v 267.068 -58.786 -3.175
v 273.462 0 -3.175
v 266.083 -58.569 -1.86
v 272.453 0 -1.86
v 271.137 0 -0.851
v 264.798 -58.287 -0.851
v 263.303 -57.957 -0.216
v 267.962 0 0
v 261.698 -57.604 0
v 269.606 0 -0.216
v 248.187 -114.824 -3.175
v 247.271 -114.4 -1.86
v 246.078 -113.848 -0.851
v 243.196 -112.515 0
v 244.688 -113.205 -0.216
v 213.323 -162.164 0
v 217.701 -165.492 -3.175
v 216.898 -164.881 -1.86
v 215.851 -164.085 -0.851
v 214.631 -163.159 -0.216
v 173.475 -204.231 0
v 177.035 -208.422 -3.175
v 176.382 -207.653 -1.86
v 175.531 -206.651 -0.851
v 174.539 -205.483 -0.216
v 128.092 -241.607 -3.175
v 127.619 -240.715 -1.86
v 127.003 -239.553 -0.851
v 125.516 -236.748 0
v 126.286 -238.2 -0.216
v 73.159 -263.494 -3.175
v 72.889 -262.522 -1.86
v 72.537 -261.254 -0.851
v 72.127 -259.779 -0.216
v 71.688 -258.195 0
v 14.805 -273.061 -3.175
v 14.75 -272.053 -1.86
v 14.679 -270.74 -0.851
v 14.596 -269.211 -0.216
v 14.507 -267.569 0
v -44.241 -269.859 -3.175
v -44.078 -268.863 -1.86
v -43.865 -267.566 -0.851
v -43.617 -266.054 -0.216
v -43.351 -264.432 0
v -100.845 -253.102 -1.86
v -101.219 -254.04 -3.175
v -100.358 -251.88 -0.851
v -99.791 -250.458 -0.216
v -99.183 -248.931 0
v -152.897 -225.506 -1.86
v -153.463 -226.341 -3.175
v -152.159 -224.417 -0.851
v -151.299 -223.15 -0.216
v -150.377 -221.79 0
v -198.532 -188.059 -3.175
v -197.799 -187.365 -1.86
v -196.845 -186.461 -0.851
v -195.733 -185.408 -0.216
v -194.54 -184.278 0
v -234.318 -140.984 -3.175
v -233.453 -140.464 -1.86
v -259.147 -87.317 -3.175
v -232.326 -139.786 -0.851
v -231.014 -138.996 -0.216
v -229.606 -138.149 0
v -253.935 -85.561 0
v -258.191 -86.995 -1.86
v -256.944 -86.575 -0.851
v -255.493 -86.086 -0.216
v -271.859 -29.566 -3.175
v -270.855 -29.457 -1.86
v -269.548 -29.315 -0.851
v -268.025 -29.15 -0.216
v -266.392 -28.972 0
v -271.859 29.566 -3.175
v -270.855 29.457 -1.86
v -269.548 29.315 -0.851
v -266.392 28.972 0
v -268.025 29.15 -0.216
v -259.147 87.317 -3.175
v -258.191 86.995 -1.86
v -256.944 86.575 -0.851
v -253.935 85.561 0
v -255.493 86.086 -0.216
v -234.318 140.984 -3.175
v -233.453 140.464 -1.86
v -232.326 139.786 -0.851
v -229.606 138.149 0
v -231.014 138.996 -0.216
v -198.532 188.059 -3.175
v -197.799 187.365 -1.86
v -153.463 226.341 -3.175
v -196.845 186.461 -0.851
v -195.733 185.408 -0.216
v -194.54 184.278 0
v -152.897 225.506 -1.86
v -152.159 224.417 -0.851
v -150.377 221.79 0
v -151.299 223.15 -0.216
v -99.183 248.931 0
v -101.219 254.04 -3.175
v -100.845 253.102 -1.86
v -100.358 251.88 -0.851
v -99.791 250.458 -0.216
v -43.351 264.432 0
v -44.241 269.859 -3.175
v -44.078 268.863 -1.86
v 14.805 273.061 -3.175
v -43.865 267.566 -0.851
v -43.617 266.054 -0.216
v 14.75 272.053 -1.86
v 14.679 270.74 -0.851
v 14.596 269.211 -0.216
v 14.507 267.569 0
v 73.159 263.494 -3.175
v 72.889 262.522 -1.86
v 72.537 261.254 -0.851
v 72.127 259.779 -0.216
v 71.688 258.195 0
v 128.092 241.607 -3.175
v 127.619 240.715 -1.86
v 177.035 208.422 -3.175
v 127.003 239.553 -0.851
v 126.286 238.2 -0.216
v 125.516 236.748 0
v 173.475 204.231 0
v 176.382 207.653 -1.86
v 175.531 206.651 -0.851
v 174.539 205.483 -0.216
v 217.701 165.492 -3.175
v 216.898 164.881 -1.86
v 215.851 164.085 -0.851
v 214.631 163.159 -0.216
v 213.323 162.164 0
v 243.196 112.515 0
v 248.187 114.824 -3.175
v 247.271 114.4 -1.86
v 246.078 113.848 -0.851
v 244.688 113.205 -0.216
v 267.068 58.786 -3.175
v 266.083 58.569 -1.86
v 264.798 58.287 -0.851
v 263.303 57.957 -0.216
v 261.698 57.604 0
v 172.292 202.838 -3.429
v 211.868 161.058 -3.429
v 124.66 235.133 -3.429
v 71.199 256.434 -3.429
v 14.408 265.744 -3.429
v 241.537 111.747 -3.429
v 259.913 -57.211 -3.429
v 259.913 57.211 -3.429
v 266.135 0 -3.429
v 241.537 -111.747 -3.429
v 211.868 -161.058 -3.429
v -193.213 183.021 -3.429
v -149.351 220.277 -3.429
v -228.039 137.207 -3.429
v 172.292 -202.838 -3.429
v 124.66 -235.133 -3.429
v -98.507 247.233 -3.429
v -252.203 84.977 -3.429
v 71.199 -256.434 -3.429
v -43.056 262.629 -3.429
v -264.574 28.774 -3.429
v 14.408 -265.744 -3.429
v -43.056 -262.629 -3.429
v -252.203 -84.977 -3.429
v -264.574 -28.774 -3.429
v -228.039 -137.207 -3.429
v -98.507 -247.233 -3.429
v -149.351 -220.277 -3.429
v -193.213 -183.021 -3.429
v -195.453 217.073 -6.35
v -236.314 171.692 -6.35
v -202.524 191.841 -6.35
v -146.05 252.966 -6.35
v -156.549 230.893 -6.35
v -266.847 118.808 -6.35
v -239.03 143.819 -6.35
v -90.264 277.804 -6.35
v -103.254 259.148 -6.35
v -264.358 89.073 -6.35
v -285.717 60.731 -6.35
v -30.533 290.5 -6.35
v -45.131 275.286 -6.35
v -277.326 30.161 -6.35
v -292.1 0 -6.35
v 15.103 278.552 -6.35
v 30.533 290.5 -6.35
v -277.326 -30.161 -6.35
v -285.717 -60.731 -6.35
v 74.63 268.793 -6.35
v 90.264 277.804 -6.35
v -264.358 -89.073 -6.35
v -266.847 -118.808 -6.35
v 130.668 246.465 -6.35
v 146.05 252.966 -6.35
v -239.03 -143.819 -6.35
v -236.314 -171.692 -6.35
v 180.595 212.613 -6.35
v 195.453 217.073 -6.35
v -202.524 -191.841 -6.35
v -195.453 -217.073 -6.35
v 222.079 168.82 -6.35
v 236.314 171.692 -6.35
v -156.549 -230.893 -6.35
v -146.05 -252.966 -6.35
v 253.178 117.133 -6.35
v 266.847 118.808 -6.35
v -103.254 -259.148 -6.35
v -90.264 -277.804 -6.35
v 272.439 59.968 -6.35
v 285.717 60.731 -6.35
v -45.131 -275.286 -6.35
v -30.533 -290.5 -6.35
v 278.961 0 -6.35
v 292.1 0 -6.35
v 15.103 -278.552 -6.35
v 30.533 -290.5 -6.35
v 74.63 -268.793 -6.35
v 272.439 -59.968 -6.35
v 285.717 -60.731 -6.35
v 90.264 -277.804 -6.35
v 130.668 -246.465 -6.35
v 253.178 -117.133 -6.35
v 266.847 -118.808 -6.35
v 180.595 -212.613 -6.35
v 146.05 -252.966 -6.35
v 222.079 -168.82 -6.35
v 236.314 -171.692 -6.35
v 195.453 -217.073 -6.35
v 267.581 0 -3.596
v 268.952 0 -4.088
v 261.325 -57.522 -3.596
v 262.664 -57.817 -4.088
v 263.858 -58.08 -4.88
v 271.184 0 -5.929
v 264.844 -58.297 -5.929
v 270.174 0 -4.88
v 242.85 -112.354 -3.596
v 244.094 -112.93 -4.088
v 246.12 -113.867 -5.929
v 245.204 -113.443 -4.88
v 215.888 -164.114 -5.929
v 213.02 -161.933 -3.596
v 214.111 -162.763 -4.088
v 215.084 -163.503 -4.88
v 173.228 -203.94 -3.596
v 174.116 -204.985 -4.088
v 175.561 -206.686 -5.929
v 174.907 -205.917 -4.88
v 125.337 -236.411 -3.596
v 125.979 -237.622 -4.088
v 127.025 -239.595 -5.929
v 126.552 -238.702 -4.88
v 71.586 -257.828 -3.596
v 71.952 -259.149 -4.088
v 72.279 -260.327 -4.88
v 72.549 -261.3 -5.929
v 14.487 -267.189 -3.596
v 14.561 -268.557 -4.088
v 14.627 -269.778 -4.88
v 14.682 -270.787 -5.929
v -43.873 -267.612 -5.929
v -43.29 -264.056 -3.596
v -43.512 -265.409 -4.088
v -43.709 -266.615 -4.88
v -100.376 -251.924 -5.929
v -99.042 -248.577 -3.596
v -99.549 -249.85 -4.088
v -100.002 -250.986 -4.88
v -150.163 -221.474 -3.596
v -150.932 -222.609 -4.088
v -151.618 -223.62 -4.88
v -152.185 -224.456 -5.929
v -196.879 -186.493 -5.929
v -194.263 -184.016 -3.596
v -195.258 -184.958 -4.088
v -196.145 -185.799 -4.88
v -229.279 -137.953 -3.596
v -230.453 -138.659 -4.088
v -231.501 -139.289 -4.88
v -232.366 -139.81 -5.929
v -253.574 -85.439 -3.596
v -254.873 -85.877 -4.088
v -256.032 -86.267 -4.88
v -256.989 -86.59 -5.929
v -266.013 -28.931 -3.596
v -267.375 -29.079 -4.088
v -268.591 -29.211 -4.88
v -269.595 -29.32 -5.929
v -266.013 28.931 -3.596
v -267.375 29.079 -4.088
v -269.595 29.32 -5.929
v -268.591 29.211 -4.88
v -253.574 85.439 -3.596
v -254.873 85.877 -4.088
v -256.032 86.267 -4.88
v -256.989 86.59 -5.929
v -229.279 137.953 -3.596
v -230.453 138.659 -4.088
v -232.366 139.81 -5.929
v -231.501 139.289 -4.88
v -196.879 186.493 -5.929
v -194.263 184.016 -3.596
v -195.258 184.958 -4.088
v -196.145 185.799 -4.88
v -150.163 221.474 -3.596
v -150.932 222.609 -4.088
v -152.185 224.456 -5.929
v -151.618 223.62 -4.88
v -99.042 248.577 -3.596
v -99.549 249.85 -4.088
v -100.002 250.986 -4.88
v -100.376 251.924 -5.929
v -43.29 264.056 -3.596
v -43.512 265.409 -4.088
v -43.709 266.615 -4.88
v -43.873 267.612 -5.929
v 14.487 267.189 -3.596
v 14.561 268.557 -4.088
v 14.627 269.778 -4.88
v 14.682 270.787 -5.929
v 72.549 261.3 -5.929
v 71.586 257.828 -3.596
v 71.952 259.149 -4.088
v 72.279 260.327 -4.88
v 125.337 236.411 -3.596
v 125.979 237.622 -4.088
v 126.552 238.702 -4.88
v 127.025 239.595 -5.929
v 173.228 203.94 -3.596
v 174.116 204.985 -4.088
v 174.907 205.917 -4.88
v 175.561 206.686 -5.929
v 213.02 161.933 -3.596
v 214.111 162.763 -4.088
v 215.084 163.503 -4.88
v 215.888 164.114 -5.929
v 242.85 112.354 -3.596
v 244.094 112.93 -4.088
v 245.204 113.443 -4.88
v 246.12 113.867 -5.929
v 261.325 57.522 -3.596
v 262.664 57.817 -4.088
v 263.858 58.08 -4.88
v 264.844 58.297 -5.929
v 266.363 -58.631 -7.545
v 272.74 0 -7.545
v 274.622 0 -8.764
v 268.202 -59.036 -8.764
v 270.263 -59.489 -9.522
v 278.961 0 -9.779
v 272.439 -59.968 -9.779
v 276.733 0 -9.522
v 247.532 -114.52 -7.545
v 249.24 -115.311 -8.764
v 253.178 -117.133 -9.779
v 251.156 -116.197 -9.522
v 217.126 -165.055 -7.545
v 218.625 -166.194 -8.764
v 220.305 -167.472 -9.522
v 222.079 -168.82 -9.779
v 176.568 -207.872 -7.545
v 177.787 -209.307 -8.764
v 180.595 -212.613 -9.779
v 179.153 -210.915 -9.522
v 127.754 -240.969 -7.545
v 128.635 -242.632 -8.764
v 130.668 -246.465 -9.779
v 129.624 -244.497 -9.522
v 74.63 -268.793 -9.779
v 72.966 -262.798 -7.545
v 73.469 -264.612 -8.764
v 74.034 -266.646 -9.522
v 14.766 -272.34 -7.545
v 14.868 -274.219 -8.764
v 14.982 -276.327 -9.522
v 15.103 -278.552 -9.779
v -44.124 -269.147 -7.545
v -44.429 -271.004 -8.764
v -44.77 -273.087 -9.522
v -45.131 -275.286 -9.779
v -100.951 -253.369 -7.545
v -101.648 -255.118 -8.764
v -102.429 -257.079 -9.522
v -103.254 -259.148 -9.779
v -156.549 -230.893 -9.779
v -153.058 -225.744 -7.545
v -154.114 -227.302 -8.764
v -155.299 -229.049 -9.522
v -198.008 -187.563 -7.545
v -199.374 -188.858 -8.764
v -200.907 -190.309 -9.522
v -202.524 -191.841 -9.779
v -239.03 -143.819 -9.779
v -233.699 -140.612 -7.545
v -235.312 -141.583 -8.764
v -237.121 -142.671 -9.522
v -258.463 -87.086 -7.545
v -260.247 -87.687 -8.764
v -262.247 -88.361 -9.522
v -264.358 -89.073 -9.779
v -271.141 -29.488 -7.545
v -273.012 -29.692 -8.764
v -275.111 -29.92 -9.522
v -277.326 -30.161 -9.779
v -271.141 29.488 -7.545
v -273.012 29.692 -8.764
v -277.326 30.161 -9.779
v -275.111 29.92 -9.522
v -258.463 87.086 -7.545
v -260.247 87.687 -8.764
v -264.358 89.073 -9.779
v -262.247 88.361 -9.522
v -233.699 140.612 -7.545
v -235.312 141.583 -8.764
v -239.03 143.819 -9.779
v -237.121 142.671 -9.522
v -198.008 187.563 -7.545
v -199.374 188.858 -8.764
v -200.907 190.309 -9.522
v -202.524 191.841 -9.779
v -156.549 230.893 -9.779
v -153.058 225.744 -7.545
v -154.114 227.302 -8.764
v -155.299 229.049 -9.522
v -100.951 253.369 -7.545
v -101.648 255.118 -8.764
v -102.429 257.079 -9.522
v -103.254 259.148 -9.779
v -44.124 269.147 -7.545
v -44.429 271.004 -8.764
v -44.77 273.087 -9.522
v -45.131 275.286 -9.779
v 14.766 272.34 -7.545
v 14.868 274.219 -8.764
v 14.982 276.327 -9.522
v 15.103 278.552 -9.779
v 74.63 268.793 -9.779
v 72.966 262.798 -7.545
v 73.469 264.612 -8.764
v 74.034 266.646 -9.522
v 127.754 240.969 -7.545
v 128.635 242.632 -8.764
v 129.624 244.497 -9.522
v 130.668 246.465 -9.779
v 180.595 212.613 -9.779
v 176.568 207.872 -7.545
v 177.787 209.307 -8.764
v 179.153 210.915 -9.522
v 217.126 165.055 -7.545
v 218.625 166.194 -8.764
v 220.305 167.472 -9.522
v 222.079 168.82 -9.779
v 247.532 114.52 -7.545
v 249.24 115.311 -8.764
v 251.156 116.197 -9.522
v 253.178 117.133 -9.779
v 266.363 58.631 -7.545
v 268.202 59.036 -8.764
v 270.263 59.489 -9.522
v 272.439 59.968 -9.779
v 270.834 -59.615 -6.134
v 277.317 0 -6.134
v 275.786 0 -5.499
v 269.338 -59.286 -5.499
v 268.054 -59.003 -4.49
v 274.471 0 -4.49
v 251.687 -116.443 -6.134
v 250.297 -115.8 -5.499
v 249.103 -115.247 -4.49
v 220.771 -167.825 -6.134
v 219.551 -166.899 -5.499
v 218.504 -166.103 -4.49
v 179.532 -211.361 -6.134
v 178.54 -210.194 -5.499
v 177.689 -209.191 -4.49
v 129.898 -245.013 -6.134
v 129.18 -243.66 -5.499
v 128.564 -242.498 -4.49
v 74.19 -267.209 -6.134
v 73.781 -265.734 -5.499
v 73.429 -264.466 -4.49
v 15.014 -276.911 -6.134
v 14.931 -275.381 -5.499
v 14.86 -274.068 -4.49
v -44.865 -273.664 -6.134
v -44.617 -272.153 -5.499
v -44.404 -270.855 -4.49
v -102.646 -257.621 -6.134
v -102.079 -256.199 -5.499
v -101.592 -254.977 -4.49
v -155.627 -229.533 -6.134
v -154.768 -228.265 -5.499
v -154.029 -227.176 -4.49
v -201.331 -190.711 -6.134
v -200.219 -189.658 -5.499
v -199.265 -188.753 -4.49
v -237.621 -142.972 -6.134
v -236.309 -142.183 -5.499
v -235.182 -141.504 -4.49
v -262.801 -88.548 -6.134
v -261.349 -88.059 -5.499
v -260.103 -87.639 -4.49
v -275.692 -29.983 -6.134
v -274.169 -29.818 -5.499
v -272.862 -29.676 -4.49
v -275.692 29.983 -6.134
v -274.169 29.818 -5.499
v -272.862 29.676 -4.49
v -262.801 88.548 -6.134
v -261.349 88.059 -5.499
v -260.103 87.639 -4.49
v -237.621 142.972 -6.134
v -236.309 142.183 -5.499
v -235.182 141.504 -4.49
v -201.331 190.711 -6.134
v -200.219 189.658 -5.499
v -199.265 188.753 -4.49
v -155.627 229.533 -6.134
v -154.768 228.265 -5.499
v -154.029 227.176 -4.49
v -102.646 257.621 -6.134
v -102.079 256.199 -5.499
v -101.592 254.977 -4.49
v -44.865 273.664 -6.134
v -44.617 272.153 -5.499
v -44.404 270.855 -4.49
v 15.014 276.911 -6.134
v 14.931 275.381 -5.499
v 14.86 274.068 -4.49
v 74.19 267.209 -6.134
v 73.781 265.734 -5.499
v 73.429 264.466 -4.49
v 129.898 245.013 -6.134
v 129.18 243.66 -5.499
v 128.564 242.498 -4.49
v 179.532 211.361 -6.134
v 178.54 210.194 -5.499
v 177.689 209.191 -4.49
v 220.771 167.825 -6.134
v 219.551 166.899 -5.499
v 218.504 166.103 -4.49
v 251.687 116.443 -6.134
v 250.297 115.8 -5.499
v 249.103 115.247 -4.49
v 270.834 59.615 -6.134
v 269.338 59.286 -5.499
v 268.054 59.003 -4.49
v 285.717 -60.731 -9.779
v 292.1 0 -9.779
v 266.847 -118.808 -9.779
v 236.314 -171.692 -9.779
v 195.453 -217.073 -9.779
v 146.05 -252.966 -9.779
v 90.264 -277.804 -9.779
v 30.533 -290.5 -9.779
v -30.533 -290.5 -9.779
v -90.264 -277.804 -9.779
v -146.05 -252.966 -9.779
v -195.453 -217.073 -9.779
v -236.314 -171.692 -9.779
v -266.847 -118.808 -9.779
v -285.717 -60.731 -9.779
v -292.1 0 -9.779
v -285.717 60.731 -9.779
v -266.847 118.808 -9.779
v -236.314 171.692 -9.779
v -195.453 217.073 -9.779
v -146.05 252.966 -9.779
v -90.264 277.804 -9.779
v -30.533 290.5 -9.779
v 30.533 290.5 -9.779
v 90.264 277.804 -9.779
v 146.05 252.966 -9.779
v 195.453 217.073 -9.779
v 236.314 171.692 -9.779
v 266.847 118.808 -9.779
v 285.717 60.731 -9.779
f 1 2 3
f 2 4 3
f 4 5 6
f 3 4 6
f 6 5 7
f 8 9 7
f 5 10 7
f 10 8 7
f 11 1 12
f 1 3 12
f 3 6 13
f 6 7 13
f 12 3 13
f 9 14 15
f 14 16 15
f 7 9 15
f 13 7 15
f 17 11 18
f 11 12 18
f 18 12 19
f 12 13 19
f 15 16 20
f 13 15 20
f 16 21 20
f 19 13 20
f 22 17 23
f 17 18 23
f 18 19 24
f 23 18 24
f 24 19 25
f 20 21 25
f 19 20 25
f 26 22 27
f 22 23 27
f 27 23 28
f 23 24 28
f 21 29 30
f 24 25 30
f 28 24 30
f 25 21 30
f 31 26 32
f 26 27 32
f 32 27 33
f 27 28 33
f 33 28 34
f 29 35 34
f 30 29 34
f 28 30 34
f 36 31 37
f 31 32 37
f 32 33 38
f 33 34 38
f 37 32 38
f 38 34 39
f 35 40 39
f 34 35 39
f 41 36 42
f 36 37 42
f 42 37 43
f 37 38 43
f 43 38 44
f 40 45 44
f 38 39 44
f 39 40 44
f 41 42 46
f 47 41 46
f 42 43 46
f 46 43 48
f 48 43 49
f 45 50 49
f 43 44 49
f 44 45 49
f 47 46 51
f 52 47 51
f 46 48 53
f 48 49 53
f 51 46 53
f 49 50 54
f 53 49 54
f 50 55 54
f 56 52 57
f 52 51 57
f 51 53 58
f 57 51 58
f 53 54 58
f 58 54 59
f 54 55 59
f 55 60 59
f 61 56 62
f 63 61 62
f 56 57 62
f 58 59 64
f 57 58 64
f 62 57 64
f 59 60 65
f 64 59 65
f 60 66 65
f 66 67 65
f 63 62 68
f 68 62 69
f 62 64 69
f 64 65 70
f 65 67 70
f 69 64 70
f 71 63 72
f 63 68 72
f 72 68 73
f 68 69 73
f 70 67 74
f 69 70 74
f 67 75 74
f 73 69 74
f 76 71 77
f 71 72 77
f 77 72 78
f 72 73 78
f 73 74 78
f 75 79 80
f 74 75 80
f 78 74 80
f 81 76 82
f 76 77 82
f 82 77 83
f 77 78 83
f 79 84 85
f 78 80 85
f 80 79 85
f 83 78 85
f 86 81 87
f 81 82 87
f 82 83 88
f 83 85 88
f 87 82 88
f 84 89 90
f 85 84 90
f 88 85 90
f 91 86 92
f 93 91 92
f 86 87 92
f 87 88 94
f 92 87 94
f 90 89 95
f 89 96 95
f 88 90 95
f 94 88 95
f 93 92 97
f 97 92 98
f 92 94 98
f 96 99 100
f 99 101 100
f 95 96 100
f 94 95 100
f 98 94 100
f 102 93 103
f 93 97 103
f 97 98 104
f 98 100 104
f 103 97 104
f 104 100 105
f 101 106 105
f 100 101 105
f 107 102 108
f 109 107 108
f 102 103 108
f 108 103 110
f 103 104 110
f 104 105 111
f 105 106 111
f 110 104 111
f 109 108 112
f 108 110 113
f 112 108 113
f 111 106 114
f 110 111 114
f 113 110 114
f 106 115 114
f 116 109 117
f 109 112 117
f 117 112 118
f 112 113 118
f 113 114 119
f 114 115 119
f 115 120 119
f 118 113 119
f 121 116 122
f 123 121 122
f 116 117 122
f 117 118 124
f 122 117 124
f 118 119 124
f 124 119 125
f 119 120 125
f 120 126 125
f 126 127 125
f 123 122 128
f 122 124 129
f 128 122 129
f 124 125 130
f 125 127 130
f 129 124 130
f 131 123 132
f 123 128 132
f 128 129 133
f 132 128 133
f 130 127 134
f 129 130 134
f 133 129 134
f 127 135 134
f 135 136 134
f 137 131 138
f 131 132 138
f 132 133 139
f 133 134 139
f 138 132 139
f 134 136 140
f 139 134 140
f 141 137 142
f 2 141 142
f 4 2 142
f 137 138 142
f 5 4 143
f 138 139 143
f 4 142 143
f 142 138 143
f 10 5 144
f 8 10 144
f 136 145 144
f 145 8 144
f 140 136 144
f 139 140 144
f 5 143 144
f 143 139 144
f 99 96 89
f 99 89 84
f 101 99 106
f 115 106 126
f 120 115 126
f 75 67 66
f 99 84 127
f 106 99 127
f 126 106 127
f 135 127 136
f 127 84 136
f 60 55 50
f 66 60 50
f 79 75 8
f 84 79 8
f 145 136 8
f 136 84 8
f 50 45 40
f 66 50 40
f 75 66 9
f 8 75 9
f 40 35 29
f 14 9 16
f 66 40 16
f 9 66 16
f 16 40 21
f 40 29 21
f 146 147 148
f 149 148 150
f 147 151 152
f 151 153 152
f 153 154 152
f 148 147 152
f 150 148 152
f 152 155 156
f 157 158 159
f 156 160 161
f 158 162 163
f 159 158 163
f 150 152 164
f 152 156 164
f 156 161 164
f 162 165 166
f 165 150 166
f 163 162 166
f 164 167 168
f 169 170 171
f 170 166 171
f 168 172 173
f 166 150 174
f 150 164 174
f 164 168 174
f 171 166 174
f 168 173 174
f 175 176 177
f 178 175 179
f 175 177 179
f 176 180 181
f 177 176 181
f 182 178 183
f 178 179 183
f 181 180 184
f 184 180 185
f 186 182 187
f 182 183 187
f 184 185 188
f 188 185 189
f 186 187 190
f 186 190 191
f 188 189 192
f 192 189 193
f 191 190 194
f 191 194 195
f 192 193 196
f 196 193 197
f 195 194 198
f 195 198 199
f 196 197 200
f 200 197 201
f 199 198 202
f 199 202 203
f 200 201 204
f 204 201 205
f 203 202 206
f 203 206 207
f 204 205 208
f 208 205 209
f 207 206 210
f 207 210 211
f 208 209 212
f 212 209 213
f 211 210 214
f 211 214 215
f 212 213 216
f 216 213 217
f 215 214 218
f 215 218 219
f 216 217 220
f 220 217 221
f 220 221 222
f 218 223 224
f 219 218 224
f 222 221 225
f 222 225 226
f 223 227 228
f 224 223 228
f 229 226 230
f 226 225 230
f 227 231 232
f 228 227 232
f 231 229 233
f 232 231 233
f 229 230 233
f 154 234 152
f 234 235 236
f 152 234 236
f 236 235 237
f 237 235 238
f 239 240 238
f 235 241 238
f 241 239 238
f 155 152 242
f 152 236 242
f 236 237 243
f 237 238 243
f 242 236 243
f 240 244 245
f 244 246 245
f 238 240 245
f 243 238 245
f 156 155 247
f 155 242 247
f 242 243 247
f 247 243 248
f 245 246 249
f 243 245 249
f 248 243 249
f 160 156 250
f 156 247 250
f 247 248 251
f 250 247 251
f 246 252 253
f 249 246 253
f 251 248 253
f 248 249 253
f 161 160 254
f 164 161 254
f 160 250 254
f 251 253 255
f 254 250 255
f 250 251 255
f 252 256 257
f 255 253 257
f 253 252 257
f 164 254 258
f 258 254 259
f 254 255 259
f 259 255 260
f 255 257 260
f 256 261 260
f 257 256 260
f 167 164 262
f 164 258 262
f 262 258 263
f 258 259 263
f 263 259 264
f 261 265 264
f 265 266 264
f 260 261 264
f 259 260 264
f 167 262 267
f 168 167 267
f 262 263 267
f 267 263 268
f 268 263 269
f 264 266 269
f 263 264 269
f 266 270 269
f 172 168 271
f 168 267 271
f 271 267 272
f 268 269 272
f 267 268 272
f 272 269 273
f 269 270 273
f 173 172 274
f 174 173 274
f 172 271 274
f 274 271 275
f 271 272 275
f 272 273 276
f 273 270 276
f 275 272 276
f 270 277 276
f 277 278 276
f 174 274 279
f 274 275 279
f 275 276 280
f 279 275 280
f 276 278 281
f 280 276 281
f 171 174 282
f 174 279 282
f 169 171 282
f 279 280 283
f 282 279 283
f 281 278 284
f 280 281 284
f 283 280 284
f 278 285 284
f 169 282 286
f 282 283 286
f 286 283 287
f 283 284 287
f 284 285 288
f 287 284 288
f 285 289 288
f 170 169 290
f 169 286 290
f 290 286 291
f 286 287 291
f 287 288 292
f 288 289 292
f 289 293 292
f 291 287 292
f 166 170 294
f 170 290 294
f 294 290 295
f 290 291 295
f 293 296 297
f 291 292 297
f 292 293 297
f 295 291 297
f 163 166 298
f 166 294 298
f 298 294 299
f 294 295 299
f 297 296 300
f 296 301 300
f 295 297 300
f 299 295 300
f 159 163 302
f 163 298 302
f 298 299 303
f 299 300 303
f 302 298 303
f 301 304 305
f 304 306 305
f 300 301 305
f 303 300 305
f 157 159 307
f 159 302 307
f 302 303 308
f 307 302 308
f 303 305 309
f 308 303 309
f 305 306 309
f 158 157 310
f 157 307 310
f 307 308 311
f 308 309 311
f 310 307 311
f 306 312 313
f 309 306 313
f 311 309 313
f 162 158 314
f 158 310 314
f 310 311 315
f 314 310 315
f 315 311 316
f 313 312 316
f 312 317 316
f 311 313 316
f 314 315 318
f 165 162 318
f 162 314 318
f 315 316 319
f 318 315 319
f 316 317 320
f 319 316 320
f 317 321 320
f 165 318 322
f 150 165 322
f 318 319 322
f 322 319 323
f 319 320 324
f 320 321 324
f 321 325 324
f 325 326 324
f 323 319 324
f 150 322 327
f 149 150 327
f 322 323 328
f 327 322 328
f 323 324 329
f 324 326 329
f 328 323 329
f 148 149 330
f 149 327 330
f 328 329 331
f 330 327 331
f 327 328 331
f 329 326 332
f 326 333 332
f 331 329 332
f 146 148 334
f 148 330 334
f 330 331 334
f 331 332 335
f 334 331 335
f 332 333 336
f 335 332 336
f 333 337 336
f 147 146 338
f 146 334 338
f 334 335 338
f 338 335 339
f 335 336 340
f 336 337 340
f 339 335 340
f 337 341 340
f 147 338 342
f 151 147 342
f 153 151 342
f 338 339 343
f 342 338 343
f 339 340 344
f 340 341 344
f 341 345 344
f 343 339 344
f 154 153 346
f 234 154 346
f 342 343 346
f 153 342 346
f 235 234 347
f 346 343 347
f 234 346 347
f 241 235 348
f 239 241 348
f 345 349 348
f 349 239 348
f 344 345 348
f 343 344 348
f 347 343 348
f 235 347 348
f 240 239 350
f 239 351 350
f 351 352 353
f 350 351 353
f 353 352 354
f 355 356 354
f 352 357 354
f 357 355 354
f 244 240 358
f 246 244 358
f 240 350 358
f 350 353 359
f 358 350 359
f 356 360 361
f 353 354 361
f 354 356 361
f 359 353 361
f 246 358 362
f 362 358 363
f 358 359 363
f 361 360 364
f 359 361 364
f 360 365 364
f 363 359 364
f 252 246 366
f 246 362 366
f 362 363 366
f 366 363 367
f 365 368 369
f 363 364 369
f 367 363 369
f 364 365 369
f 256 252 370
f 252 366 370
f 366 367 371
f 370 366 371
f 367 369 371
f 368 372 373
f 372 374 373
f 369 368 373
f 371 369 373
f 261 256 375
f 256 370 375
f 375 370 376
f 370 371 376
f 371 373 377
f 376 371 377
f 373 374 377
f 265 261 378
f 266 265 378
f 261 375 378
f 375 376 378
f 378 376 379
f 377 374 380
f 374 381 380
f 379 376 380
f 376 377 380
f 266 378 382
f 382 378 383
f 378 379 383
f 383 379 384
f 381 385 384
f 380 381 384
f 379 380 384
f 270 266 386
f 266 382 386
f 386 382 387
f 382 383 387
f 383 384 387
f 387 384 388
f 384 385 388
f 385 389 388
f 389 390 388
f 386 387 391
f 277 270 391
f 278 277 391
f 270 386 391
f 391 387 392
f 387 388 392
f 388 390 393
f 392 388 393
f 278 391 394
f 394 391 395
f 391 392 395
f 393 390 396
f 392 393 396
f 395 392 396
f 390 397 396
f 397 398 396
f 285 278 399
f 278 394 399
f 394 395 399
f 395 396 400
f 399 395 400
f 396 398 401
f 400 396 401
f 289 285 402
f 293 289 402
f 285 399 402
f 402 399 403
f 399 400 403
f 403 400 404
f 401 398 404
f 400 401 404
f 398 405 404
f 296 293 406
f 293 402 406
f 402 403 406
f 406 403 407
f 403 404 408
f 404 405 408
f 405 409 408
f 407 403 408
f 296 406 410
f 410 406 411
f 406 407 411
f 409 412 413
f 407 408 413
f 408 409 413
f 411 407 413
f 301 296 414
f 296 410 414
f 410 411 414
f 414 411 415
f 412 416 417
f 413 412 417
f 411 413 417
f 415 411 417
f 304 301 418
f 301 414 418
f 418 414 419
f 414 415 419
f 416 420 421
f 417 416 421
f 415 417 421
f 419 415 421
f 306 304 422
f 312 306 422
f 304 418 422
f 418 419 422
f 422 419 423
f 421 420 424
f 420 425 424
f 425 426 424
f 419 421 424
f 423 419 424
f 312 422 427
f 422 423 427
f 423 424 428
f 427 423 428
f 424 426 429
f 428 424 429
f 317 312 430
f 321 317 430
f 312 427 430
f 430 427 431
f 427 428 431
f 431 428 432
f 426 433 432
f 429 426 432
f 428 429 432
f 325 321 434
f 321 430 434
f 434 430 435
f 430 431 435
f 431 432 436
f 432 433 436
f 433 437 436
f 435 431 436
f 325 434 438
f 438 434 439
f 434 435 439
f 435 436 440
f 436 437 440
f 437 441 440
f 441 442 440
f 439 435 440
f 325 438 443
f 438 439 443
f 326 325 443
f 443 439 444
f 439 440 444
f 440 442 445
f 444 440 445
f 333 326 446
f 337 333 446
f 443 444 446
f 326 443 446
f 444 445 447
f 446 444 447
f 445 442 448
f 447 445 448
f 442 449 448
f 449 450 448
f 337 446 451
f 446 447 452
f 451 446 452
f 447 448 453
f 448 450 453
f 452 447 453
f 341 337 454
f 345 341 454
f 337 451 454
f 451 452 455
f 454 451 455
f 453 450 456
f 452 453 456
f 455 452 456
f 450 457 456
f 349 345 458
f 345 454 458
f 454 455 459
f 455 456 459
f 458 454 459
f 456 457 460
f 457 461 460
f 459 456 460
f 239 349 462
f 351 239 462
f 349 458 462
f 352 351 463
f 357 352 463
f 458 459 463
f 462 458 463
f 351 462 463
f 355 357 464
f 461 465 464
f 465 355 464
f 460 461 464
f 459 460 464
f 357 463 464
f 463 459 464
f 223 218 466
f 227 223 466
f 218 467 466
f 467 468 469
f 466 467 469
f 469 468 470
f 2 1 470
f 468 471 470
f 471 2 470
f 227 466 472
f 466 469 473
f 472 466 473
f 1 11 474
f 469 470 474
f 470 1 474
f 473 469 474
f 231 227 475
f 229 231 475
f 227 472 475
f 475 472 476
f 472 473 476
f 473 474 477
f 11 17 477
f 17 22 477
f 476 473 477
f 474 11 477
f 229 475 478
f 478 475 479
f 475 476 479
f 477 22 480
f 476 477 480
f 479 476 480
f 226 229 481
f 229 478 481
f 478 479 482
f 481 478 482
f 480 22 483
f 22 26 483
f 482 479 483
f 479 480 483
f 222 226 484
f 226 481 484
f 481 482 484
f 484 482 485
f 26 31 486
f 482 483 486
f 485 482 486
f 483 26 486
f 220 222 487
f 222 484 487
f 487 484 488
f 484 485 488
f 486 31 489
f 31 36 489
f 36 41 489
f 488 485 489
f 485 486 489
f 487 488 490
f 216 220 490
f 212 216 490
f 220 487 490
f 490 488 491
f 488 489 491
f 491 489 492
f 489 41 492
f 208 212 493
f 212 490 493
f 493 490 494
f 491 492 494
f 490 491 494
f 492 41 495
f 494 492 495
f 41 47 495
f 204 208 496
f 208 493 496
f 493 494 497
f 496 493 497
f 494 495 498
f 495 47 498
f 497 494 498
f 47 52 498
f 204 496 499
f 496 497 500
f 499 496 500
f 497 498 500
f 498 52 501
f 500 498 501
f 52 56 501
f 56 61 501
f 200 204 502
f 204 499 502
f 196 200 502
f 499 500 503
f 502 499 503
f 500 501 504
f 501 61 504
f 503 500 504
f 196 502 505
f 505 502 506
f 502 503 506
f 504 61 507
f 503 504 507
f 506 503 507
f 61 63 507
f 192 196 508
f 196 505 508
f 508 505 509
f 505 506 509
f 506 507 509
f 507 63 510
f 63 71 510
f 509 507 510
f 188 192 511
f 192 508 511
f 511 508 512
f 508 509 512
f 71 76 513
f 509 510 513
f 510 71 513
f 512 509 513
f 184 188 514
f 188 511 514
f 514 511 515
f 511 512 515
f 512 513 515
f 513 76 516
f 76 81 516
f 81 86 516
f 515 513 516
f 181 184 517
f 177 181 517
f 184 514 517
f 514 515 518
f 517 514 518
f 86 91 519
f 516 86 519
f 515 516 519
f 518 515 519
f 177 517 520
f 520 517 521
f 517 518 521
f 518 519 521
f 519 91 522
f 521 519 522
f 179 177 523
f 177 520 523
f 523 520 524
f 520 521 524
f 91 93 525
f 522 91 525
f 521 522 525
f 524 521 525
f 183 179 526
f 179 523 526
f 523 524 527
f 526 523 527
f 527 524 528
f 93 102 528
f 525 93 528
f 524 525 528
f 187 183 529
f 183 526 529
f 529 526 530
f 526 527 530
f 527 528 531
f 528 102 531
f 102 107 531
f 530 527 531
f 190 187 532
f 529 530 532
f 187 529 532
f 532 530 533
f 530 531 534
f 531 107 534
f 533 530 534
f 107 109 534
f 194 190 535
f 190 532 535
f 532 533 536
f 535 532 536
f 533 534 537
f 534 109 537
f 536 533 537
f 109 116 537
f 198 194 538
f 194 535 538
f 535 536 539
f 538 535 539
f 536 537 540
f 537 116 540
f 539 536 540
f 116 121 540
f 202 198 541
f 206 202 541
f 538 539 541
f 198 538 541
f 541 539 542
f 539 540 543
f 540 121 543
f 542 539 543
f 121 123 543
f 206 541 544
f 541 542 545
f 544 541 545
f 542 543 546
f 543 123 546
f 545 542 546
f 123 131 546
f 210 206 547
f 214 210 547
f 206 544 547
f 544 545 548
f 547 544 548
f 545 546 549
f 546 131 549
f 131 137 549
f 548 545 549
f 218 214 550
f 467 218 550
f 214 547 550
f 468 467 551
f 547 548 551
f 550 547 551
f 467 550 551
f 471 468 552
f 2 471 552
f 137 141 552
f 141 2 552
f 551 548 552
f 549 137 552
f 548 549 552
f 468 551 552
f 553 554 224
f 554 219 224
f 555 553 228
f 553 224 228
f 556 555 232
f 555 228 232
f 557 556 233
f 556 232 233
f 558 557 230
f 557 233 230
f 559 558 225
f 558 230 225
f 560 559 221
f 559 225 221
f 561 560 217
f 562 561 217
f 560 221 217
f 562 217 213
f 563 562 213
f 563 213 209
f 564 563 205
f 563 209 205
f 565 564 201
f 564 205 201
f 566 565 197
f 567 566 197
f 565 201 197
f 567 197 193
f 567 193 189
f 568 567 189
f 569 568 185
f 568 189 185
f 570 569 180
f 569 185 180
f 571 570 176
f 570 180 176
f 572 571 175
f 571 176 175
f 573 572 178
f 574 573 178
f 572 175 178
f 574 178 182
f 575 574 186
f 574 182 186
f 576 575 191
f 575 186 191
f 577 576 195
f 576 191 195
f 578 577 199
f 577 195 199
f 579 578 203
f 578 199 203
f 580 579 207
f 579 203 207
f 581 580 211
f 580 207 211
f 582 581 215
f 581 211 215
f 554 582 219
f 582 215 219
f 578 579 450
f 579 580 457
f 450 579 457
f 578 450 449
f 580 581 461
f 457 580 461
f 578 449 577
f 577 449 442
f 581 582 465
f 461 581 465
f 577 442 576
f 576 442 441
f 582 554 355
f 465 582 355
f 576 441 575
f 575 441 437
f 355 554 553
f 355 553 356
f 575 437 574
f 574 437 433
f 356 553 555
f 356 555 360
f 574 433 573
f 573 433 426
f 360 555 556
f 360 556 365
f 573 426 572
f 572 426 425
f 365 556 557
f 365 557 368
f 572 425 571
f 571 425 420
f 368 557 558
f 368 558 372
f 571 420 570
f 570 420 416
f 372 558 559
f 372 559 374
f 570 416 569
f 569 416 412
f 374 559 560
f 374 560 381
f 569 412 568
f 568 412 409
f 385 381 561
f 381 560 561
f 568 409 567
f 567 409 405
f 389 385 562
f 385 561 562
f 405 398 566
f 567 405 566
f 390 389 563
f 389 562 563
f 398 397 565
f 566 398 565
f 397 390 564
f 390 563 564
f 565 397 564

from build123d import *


with BuildPart() as f1:
    # F0 (on Front) → F1 (revolve)
    with BuildSketch(Plane.XZ):
        with BuildLine():
            Line((267.962432, 0), (0, 0))
            Line((0, 0), (0, -3.429))
            Line((0, -3.429), (266.134583, -3.429))
            ThreePointArc((266.134583, -3.429), (268.95194, -4.088218), (271.184336, -5.929))
            ThreePointArc((271.184336, -5.929), (274.622225, -8.763804), (278.960955, -9.779))
            Line((278.960955, -9.779), (292.1, -9.779))
            Line((292.1, -9.779), (292.1, -6.35))
            Line((292.1, -6.35), (278.960955, -6.35))
            ThreePointArc((278.960955, -6.35), (275.785955, -5.499261), (273.461693, -3.175))
            ThreePointArc((273.461693, -3.175), (271.137432, -0.850739), (267.962432, 0))
        make_face()
    revolve(axis=Axis((0, 0, -1.7145), (0, 0, -1)))


solid = f1.part
